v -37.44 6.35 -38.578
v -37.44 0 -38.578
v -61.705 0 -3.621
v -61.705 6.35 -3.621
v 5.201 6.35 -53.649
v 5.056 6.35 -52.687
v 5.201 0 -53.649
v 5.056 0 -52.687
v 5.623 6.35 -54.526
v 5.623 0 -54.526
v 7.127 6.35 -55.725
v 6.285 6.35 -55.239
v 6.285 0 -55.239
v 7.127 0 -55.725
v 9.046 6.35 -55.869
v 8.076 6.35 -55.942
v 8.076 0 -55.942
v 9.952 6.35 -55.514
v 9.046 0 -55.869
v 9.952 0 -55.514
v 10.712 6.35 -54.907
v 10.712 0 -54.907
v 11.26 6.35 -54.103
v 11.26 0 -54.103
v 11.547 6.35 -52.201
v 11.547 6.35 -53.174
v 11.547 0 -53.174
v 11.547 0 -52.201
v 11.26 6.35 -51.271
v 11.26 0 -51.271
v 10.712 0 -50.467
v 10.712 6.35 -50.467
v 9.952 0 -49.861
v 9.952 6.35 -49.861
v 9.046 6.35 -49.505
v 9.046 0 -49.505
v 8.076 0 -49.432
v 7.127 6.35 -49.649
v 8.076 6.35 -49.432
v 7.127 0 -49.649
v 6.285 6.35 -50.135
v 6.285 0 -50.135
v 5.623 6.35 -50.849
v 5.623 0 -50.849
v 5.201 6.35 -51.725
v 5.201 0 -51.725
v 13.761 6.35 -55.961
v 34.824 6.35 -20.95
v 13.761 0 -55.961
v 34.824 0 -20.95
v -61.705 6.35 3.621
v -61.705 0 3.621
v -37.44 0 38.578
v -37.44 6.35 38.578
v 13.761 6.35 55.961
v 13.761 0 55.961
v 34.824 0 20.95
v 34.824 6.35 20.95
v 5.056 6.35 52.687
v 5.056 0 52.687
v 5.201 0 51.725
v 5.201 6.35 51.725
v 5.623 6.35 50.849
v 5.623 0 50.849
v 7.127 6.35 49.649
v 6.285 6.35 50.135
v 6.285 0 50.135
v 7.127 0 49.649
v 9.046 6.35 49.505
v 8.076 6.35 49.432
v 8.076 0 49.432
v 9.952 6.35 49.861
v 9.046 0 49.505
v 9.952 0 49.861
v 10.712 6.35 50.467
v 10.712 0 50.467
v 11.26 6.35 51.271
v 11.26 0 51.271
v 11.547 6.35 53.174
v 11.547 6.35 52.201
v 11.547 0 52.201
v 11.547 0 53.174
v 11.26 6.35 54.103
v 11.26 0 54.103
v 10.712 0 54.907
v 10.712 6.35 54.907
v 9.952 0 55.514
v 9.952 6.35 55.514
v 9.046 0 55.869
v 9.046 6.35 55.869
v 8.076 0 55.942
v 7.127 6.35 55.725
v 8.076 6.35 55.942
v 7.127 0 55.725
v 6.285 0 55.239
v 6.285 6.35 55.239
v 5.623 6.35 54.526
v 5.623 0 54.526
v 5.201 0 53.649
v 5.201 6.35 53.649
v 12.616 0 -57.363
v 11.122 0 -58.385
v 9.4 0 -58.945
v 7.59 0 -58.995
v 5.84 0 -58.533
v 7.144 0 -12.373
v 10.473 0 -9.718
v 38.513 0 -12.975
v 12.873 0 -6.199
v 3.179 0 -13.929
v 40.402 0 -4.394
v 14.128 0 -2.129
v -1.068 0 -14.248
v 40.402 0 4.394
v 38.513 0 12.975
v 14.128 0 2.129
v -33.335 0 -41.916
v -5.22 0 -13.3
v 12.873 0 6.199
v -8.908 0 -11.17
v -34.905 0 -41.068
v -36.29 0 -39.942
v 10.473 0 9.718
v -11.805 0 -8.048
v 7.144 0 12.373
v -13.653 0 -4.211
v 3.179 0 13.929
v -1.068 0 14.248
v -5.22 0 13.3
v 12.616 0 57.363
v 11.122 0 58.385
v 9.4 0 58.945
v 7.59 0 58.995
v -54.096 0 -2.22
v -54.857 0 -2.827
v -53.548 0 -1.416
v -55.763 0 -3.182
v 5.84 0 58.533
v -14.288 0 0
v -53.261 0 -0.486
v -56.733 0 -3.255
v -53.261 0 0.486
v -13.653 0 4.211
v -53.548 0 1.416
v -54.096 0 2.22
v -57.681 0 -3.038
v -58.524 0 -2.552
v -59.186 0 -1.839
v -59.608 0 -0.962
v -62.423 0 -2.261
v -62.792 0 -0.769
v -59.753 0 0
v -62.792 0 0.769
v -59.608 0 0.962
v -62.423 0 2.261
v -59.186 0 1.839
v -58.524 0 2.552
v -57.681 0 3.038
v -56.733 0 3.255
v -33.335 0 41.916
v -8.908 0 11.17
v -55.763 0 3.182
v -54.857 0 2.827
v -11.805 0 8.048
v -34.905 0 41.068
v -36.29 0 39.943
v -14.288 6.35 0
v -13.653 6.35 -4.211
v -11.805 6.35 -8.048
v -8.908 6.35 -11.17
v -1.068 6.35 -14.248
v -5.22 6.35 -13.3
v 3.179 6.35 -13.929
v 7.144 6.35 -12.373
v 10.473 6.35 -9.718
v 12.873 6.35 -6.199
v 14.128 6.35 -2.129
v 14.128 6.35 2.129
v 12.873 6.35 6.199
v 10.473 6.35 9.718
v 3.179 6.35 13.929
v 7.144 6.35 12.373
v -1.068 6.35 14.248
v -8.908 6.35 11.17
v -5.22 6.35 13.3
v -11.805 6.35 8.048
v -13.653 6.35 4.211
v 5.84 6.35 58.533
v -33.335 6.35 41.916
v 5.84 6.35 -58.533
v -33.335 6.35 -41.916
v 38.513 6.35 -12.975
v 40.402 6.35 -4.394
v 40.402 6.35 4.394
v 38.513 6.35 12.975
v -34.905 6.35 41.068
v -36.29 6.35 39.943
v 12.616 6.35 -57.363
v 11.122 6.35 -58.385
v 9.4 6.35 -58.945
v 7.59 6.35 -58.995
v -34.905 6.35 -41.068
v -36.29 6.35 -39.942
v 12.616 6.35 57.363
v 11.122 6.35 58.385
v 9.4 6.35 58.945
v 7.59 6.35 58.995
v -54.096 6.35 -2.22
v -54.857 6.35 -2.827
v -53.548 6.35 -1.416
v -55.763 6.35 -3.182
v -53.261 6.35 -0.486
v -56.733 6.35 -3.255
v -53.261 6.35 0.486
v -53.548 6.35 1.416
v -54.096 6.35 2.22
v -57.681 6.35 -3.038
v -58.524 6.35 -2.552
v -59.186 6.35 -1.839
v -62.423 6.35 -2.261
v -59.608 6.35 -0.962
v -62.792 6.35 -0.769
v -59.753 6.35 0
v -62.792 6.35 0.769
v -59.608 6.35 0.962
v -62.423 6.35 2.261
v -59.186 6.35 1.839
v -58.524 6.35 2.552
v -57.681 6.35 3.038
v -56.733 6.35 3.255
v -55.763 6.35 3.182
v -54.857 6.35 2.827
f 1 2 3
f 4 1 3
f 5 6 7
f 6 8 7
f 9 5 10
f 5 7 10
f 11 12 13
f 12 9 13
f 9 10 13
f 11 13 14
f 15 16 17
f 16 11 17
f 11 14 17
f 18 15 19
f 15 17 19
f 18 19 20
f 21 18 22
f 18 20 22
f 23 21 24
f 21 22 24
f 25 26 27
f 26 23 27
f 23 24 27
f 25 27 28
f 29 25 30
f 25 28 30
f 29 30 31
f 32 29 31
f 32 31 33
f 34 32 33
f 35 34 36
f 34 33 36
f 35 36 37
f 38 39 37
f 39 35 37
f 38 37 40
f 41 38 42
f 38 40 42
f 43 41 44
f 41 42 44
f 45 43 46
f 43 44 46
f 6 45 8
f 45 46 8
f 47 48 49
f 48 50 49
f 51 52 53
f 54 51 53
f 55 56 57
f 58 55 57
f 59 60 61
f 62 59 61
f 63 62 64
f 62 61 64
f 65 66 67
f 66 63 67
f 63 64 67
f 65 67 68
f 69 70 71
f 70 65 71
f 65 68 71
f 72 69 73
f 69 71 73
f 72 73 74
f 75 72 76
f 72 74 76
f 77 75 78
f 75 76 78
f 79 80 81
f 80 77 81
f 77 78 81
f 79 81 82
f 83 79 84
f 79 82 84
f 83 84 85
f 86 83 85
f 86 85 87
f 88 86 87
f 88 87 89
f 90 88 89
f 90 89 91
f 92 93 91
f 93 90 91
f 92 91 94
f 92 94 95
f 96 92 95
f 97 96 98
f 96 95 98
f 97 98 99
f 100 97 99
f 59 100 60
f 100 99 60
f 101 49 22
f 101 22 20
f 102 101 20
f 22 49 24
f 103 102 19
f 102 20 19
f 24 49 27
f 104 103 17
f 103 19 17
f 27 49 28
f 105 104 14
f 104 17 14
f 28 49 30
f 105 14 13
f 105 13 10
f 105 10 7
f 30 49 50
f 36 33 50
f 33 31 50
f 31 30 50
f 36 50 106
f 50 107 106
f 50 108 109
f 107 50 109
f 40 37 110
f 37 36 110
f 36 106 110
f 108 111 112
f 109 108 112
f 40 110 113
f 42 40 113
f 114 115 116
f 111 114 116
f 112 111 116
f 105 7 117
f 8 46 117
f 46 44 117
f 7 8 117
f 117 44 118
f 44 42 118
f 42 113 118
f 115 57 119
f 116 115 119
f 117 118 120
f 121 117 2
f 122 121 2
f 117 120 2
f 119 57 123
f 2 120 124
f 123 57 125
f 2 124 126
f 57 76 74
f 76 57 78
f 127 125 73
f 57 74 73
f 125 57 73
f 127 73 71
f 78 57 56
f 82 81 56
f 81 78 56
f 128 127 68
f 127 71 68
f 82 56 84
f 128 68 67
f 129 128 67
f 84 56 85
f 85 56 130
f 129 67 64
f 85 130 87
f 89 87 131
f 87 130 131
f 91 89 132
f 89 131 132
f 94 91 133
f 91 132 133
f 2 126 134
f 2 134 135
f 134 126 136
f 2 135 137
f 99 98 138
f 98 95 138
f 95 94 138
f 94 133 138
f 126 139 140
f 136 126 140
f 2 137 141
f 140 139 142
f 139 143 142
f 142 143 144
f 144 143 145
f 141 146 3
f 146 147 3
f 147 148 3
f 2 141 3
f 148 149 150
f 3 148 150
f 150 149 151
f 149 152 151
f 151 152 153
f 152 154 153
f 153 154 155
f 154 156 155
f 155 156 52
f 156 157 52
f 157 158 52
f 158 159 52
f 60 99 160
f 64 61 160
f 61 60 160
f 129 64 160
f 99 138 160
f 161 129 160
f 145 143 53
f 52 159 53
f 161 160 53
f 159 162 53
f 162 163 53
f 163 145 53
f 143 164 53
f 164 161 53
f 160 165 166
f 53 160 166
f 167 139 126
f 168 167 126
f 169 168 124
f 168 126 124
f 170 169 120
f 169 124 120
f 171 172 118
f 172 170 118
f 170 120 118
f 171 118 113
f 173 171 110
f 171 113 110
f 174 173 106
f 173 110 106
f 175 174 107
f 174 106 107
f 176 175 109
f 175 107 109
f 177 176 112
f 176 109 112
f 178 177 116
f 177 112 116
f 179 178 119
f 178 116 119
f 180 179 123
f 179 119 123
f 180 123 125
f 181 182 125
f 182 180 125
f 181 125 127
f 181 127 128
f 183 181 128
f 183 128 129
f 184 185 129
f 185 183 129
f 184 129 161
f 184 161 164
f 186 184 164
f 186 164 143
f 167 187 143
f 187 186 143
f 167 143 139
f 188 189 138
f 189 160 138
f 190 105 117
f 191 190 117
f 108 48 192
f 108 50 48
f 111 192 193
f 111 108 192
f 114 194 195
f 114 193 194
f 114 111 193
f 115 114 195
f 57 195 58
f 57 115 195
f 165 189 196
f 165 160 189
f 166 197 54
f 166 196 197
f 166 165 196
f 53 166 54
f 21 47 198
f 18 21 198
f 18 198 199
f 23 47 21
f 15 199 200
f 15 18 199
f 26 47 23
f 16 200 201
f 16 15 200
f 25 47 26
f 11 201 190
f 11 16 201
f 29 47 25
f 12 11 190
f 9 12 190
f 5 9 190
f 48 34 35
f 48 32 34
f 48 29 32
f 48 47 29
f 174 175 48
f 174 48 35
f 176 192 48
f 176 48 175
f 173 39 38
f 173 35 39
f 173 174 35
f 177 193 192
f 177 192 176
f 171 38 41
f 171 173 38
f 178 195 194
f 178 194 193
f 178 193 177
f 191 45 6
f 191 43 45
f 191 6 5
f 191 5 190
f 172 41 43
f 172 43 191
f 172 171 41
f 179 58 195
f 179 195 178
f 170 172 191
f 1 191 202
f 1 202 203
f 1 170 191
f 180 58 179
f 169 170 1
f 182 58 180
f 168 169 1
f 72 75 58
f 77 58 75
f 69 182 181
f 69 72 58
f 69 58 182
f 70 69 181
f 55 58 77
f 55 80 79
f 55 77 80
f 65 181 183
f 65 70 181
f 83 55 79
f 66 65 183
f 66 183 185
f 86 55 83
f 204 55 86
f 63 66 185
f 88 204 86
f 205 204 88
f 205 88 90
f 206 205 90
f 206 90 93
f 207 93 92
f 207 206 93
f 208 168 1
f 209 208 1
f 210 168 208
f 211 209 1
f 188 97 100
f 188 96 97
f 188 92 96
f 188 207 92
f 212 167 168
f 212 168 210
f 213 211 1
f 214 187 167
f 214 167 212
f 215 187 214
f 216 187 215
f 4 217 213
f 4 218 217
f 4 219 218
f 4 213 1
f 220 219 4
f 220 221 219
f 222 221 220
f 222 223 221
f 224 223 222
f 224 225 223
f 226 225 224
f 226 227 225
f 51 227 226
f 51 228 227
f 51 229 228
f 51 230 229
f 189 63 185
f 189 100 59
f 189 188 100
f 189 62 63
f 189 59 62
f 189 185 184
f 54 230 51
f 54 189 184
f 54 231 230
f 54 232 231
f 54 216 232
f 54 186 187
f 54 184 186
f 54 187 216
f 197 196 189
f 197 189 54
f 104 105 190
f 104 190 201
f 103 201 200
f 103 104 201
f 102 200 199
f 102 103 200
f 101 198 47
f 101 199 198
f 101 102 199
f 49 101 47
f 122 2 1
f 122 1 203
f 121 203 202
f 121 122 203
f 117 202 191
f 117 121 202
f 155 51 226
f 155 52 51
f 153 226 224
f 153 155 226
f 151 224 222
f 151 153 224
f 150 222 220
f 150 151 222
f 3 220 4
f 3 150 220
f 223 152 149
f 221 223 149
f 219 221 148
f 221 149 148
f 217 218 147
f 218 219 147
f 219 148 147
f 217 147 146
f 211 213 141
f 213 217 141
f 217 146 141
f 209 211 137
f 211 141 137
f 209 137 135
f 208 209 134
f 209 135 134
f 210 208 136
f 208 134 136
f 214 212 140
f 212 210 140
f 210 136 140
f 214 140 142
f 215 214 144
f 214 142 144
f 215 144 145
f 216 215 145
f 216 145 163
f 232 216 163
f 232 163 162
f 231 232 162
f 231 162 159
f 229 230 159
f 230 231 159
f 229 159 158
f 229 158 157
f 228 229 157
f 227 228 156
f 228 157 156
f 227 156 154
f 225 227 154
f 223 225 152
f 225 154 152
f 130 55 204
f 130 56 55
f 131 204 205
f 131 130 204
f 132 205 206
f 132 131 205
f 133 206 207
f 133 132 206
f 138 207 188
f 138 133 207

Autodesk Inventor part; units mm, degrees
ref_plane "YZ Plane" through (0, 0, 0) normal (1, 0, 0) x (0, 1, 0)
ref_plane "XZ Plane" through (0, 0, 0) normal (0, 1, 0) x (-1, 0, 0)
ref_plane "XY Plane" through (0, 0, 0) normal (0, 0, 1) x (1, 0, 0)
sketch "Sketch1" plane through (0, 0, 0) normal (0, 1, 0) x (-1, 0, 0)
  circle A0 centre (29.6155, 33.147) radius 6.35 construction
  circle A1 centre (0, 0) radius 38.1 construction
  circle A2 centre (29.6155, -33.147) radius 6.35 construction
  circle A3 centre (29.6155, 33.147) radius 29.972 construction
  circle A4 centre (29.6155, -33.147) radius 29.972 construction
  line L0 (29.6155, 3.175) -> (29.6155, -3.175) construction
  circle A5 centre (0, 0) radius 40.64 construction
  circle A6 centre (-8.3197, 52.6872) radius 6.35 construction
  circle A7 centre (-8.3197, 52.6872) radius 3.2639
  line L1 (-7.3293, 46.4149) -> (-6.3388, 40.1426) construction
  line L2 (-2.6746, 49.7794) -> (2.9705, 46.8716) construction
  circle A8 centre (-8.3197, -52.6872) radius 6.35 construction
  circle A9 centre (-8.3197, -52.6872) radius 3.2639
  line L3 (-7.3293, -46.4149) -> (-6.3388, -40.1426) construction
  line L4 (2.9705, -46.8716) -> (-2.6746, -49.7794) construction
  circle A10 centre (56.4888, 0) radius 6.35 construction
  circle A11 centre (56.4888, 0) radius 3.2639
  line L5 (48.4908, 9.8652) -> (52.4898, 4.9326) construction
  line L6 (52.4898, -4.9326) -> (48.4908, -9.8652) construction
  circle A12 centre (0, 0) radius 14.2875
  circle A13 centre (29.6155, 33.147) radius 9.525 construction
  circle A14 centre (29.6155, -33.147) radius 9.525 construction
  circle A15 centre (29.6155, 33.147) radius 25.4 construction
  circle A16 centre (29.6155, 58.547) radius 2.794 construction
  circle A17 centre (49.474, 48.9836) radius 2.794 construction
  circle A18 centre (54.3787, 27.495) radius 2.794 construction
  circle A19 centre (40.6362, 10.2624) radius 2.794 construction
  circle A20 centre (18.5949, 10.2624) radius 2.794 construction
  circle A21 centre (4.8523, 27.495) radius 2.794 construction
  circle A22 centre (9.757, 48.9836) radius 2.794 construction
  circle A23 centre (29.6155, -33.147) radius 25.4 construction
  circle A24 centre (29.6155, -58.547) radius 2.794 construction
  circle A25 centre (49.474, -48.9836) radius 2.794 construction
  circle A26 centre (54.3787, -27.495) radius 2.794 construction
  circle A27 centre (40.6362, -10.2624) radius 2.794 construction
  circle A28 centre (18.5949, -10.2624) radius 2.794 construction
  circle A29 centre (4.8523, -27.495) radius 2.794 construction
  circle A30 centre (9.757, -48.9836) radius 2.794 construction
  line L7 (37.4402, -38.5784) -> (61.7053, -3.6209)
  line L8 (61.7053, 3.6209) -> (37.4402, 38.5784)
  line L9 (33.335, 41.9157) -> (-5.84, 58.533)
  line L10 (-13.7609, 55.9607) -> (-34.8236, 20.9505)
  line L11 (-34.8236, -20.9505) -> (-13.7609, -55.9607)
  arc A31 (-34.8236, 20.9505) -> (-34.8236, -20.9505) centre (0, 0) ccw
  arc A32 (61.7053, -3.6209) -> (61.7053, 3.6209) centre (56.4888, 0) ccw
  arc A33 (37.4402, 38.5784) -> (33.335, 41.9157) centre (29.6155, 33.147) ccw
  arc A34 (-5.84, 58.533) -> (-13.7609, 55.9607) centre (-8.3197, 52.6872) ccw
  line L12 (-5.84, -58.533) -> (33.335, -41.9157)
  arc A35 (-13.7609, -55.9607) -> (-5.84, -58.533) centre (-8.3197, -52.6872) ccw
  arc A36 (33.335, -41.9157) -> (37.4402, -38.5784) centre (29.6155, -33.147) ccw
  point P0 (29.6155, 0)
  dimension "d21" = 50.8
  dimension "d27" = 50.8
  dimension "d0" = 12.7
  dimension "d1" = 76.2
  dimension "d2" = 12.7
  dimension "d3" = 59.944
  dimension "d4" = 59.944
  dimension "d5" = 6.35
  dimension "d6" = 2.54
  dimension "d8" = 12.7
  dimension "d9" = 6.5278
  dimension "d11" = 6.35
  dimension "d12" = 12.7
  dimension "d13" = 6.5278
  dimension "d14" = 6.35
  dimension "d15" = 12.7
  dimension "d16" = 6.5278
  dimension "d17" = 6.35
  dimension "d18" = 6.35
  dimension "d19" = 28.575
  dimension "d20" = 19.05
  dimension "d22" = 5.588
  dimension "d25" = 360
  dimension "d30" = 360
sketch "Sketch2" plane through (0, 0, 0) normal (0, 1, 0) x (-1, 0, 0)
  point P0 (0, 0)
extrude "Extrusion2" add sketch "Sketch1" along normal blind 6.35
properties part number "Bottom Plate" material "Aluminum 6061"
